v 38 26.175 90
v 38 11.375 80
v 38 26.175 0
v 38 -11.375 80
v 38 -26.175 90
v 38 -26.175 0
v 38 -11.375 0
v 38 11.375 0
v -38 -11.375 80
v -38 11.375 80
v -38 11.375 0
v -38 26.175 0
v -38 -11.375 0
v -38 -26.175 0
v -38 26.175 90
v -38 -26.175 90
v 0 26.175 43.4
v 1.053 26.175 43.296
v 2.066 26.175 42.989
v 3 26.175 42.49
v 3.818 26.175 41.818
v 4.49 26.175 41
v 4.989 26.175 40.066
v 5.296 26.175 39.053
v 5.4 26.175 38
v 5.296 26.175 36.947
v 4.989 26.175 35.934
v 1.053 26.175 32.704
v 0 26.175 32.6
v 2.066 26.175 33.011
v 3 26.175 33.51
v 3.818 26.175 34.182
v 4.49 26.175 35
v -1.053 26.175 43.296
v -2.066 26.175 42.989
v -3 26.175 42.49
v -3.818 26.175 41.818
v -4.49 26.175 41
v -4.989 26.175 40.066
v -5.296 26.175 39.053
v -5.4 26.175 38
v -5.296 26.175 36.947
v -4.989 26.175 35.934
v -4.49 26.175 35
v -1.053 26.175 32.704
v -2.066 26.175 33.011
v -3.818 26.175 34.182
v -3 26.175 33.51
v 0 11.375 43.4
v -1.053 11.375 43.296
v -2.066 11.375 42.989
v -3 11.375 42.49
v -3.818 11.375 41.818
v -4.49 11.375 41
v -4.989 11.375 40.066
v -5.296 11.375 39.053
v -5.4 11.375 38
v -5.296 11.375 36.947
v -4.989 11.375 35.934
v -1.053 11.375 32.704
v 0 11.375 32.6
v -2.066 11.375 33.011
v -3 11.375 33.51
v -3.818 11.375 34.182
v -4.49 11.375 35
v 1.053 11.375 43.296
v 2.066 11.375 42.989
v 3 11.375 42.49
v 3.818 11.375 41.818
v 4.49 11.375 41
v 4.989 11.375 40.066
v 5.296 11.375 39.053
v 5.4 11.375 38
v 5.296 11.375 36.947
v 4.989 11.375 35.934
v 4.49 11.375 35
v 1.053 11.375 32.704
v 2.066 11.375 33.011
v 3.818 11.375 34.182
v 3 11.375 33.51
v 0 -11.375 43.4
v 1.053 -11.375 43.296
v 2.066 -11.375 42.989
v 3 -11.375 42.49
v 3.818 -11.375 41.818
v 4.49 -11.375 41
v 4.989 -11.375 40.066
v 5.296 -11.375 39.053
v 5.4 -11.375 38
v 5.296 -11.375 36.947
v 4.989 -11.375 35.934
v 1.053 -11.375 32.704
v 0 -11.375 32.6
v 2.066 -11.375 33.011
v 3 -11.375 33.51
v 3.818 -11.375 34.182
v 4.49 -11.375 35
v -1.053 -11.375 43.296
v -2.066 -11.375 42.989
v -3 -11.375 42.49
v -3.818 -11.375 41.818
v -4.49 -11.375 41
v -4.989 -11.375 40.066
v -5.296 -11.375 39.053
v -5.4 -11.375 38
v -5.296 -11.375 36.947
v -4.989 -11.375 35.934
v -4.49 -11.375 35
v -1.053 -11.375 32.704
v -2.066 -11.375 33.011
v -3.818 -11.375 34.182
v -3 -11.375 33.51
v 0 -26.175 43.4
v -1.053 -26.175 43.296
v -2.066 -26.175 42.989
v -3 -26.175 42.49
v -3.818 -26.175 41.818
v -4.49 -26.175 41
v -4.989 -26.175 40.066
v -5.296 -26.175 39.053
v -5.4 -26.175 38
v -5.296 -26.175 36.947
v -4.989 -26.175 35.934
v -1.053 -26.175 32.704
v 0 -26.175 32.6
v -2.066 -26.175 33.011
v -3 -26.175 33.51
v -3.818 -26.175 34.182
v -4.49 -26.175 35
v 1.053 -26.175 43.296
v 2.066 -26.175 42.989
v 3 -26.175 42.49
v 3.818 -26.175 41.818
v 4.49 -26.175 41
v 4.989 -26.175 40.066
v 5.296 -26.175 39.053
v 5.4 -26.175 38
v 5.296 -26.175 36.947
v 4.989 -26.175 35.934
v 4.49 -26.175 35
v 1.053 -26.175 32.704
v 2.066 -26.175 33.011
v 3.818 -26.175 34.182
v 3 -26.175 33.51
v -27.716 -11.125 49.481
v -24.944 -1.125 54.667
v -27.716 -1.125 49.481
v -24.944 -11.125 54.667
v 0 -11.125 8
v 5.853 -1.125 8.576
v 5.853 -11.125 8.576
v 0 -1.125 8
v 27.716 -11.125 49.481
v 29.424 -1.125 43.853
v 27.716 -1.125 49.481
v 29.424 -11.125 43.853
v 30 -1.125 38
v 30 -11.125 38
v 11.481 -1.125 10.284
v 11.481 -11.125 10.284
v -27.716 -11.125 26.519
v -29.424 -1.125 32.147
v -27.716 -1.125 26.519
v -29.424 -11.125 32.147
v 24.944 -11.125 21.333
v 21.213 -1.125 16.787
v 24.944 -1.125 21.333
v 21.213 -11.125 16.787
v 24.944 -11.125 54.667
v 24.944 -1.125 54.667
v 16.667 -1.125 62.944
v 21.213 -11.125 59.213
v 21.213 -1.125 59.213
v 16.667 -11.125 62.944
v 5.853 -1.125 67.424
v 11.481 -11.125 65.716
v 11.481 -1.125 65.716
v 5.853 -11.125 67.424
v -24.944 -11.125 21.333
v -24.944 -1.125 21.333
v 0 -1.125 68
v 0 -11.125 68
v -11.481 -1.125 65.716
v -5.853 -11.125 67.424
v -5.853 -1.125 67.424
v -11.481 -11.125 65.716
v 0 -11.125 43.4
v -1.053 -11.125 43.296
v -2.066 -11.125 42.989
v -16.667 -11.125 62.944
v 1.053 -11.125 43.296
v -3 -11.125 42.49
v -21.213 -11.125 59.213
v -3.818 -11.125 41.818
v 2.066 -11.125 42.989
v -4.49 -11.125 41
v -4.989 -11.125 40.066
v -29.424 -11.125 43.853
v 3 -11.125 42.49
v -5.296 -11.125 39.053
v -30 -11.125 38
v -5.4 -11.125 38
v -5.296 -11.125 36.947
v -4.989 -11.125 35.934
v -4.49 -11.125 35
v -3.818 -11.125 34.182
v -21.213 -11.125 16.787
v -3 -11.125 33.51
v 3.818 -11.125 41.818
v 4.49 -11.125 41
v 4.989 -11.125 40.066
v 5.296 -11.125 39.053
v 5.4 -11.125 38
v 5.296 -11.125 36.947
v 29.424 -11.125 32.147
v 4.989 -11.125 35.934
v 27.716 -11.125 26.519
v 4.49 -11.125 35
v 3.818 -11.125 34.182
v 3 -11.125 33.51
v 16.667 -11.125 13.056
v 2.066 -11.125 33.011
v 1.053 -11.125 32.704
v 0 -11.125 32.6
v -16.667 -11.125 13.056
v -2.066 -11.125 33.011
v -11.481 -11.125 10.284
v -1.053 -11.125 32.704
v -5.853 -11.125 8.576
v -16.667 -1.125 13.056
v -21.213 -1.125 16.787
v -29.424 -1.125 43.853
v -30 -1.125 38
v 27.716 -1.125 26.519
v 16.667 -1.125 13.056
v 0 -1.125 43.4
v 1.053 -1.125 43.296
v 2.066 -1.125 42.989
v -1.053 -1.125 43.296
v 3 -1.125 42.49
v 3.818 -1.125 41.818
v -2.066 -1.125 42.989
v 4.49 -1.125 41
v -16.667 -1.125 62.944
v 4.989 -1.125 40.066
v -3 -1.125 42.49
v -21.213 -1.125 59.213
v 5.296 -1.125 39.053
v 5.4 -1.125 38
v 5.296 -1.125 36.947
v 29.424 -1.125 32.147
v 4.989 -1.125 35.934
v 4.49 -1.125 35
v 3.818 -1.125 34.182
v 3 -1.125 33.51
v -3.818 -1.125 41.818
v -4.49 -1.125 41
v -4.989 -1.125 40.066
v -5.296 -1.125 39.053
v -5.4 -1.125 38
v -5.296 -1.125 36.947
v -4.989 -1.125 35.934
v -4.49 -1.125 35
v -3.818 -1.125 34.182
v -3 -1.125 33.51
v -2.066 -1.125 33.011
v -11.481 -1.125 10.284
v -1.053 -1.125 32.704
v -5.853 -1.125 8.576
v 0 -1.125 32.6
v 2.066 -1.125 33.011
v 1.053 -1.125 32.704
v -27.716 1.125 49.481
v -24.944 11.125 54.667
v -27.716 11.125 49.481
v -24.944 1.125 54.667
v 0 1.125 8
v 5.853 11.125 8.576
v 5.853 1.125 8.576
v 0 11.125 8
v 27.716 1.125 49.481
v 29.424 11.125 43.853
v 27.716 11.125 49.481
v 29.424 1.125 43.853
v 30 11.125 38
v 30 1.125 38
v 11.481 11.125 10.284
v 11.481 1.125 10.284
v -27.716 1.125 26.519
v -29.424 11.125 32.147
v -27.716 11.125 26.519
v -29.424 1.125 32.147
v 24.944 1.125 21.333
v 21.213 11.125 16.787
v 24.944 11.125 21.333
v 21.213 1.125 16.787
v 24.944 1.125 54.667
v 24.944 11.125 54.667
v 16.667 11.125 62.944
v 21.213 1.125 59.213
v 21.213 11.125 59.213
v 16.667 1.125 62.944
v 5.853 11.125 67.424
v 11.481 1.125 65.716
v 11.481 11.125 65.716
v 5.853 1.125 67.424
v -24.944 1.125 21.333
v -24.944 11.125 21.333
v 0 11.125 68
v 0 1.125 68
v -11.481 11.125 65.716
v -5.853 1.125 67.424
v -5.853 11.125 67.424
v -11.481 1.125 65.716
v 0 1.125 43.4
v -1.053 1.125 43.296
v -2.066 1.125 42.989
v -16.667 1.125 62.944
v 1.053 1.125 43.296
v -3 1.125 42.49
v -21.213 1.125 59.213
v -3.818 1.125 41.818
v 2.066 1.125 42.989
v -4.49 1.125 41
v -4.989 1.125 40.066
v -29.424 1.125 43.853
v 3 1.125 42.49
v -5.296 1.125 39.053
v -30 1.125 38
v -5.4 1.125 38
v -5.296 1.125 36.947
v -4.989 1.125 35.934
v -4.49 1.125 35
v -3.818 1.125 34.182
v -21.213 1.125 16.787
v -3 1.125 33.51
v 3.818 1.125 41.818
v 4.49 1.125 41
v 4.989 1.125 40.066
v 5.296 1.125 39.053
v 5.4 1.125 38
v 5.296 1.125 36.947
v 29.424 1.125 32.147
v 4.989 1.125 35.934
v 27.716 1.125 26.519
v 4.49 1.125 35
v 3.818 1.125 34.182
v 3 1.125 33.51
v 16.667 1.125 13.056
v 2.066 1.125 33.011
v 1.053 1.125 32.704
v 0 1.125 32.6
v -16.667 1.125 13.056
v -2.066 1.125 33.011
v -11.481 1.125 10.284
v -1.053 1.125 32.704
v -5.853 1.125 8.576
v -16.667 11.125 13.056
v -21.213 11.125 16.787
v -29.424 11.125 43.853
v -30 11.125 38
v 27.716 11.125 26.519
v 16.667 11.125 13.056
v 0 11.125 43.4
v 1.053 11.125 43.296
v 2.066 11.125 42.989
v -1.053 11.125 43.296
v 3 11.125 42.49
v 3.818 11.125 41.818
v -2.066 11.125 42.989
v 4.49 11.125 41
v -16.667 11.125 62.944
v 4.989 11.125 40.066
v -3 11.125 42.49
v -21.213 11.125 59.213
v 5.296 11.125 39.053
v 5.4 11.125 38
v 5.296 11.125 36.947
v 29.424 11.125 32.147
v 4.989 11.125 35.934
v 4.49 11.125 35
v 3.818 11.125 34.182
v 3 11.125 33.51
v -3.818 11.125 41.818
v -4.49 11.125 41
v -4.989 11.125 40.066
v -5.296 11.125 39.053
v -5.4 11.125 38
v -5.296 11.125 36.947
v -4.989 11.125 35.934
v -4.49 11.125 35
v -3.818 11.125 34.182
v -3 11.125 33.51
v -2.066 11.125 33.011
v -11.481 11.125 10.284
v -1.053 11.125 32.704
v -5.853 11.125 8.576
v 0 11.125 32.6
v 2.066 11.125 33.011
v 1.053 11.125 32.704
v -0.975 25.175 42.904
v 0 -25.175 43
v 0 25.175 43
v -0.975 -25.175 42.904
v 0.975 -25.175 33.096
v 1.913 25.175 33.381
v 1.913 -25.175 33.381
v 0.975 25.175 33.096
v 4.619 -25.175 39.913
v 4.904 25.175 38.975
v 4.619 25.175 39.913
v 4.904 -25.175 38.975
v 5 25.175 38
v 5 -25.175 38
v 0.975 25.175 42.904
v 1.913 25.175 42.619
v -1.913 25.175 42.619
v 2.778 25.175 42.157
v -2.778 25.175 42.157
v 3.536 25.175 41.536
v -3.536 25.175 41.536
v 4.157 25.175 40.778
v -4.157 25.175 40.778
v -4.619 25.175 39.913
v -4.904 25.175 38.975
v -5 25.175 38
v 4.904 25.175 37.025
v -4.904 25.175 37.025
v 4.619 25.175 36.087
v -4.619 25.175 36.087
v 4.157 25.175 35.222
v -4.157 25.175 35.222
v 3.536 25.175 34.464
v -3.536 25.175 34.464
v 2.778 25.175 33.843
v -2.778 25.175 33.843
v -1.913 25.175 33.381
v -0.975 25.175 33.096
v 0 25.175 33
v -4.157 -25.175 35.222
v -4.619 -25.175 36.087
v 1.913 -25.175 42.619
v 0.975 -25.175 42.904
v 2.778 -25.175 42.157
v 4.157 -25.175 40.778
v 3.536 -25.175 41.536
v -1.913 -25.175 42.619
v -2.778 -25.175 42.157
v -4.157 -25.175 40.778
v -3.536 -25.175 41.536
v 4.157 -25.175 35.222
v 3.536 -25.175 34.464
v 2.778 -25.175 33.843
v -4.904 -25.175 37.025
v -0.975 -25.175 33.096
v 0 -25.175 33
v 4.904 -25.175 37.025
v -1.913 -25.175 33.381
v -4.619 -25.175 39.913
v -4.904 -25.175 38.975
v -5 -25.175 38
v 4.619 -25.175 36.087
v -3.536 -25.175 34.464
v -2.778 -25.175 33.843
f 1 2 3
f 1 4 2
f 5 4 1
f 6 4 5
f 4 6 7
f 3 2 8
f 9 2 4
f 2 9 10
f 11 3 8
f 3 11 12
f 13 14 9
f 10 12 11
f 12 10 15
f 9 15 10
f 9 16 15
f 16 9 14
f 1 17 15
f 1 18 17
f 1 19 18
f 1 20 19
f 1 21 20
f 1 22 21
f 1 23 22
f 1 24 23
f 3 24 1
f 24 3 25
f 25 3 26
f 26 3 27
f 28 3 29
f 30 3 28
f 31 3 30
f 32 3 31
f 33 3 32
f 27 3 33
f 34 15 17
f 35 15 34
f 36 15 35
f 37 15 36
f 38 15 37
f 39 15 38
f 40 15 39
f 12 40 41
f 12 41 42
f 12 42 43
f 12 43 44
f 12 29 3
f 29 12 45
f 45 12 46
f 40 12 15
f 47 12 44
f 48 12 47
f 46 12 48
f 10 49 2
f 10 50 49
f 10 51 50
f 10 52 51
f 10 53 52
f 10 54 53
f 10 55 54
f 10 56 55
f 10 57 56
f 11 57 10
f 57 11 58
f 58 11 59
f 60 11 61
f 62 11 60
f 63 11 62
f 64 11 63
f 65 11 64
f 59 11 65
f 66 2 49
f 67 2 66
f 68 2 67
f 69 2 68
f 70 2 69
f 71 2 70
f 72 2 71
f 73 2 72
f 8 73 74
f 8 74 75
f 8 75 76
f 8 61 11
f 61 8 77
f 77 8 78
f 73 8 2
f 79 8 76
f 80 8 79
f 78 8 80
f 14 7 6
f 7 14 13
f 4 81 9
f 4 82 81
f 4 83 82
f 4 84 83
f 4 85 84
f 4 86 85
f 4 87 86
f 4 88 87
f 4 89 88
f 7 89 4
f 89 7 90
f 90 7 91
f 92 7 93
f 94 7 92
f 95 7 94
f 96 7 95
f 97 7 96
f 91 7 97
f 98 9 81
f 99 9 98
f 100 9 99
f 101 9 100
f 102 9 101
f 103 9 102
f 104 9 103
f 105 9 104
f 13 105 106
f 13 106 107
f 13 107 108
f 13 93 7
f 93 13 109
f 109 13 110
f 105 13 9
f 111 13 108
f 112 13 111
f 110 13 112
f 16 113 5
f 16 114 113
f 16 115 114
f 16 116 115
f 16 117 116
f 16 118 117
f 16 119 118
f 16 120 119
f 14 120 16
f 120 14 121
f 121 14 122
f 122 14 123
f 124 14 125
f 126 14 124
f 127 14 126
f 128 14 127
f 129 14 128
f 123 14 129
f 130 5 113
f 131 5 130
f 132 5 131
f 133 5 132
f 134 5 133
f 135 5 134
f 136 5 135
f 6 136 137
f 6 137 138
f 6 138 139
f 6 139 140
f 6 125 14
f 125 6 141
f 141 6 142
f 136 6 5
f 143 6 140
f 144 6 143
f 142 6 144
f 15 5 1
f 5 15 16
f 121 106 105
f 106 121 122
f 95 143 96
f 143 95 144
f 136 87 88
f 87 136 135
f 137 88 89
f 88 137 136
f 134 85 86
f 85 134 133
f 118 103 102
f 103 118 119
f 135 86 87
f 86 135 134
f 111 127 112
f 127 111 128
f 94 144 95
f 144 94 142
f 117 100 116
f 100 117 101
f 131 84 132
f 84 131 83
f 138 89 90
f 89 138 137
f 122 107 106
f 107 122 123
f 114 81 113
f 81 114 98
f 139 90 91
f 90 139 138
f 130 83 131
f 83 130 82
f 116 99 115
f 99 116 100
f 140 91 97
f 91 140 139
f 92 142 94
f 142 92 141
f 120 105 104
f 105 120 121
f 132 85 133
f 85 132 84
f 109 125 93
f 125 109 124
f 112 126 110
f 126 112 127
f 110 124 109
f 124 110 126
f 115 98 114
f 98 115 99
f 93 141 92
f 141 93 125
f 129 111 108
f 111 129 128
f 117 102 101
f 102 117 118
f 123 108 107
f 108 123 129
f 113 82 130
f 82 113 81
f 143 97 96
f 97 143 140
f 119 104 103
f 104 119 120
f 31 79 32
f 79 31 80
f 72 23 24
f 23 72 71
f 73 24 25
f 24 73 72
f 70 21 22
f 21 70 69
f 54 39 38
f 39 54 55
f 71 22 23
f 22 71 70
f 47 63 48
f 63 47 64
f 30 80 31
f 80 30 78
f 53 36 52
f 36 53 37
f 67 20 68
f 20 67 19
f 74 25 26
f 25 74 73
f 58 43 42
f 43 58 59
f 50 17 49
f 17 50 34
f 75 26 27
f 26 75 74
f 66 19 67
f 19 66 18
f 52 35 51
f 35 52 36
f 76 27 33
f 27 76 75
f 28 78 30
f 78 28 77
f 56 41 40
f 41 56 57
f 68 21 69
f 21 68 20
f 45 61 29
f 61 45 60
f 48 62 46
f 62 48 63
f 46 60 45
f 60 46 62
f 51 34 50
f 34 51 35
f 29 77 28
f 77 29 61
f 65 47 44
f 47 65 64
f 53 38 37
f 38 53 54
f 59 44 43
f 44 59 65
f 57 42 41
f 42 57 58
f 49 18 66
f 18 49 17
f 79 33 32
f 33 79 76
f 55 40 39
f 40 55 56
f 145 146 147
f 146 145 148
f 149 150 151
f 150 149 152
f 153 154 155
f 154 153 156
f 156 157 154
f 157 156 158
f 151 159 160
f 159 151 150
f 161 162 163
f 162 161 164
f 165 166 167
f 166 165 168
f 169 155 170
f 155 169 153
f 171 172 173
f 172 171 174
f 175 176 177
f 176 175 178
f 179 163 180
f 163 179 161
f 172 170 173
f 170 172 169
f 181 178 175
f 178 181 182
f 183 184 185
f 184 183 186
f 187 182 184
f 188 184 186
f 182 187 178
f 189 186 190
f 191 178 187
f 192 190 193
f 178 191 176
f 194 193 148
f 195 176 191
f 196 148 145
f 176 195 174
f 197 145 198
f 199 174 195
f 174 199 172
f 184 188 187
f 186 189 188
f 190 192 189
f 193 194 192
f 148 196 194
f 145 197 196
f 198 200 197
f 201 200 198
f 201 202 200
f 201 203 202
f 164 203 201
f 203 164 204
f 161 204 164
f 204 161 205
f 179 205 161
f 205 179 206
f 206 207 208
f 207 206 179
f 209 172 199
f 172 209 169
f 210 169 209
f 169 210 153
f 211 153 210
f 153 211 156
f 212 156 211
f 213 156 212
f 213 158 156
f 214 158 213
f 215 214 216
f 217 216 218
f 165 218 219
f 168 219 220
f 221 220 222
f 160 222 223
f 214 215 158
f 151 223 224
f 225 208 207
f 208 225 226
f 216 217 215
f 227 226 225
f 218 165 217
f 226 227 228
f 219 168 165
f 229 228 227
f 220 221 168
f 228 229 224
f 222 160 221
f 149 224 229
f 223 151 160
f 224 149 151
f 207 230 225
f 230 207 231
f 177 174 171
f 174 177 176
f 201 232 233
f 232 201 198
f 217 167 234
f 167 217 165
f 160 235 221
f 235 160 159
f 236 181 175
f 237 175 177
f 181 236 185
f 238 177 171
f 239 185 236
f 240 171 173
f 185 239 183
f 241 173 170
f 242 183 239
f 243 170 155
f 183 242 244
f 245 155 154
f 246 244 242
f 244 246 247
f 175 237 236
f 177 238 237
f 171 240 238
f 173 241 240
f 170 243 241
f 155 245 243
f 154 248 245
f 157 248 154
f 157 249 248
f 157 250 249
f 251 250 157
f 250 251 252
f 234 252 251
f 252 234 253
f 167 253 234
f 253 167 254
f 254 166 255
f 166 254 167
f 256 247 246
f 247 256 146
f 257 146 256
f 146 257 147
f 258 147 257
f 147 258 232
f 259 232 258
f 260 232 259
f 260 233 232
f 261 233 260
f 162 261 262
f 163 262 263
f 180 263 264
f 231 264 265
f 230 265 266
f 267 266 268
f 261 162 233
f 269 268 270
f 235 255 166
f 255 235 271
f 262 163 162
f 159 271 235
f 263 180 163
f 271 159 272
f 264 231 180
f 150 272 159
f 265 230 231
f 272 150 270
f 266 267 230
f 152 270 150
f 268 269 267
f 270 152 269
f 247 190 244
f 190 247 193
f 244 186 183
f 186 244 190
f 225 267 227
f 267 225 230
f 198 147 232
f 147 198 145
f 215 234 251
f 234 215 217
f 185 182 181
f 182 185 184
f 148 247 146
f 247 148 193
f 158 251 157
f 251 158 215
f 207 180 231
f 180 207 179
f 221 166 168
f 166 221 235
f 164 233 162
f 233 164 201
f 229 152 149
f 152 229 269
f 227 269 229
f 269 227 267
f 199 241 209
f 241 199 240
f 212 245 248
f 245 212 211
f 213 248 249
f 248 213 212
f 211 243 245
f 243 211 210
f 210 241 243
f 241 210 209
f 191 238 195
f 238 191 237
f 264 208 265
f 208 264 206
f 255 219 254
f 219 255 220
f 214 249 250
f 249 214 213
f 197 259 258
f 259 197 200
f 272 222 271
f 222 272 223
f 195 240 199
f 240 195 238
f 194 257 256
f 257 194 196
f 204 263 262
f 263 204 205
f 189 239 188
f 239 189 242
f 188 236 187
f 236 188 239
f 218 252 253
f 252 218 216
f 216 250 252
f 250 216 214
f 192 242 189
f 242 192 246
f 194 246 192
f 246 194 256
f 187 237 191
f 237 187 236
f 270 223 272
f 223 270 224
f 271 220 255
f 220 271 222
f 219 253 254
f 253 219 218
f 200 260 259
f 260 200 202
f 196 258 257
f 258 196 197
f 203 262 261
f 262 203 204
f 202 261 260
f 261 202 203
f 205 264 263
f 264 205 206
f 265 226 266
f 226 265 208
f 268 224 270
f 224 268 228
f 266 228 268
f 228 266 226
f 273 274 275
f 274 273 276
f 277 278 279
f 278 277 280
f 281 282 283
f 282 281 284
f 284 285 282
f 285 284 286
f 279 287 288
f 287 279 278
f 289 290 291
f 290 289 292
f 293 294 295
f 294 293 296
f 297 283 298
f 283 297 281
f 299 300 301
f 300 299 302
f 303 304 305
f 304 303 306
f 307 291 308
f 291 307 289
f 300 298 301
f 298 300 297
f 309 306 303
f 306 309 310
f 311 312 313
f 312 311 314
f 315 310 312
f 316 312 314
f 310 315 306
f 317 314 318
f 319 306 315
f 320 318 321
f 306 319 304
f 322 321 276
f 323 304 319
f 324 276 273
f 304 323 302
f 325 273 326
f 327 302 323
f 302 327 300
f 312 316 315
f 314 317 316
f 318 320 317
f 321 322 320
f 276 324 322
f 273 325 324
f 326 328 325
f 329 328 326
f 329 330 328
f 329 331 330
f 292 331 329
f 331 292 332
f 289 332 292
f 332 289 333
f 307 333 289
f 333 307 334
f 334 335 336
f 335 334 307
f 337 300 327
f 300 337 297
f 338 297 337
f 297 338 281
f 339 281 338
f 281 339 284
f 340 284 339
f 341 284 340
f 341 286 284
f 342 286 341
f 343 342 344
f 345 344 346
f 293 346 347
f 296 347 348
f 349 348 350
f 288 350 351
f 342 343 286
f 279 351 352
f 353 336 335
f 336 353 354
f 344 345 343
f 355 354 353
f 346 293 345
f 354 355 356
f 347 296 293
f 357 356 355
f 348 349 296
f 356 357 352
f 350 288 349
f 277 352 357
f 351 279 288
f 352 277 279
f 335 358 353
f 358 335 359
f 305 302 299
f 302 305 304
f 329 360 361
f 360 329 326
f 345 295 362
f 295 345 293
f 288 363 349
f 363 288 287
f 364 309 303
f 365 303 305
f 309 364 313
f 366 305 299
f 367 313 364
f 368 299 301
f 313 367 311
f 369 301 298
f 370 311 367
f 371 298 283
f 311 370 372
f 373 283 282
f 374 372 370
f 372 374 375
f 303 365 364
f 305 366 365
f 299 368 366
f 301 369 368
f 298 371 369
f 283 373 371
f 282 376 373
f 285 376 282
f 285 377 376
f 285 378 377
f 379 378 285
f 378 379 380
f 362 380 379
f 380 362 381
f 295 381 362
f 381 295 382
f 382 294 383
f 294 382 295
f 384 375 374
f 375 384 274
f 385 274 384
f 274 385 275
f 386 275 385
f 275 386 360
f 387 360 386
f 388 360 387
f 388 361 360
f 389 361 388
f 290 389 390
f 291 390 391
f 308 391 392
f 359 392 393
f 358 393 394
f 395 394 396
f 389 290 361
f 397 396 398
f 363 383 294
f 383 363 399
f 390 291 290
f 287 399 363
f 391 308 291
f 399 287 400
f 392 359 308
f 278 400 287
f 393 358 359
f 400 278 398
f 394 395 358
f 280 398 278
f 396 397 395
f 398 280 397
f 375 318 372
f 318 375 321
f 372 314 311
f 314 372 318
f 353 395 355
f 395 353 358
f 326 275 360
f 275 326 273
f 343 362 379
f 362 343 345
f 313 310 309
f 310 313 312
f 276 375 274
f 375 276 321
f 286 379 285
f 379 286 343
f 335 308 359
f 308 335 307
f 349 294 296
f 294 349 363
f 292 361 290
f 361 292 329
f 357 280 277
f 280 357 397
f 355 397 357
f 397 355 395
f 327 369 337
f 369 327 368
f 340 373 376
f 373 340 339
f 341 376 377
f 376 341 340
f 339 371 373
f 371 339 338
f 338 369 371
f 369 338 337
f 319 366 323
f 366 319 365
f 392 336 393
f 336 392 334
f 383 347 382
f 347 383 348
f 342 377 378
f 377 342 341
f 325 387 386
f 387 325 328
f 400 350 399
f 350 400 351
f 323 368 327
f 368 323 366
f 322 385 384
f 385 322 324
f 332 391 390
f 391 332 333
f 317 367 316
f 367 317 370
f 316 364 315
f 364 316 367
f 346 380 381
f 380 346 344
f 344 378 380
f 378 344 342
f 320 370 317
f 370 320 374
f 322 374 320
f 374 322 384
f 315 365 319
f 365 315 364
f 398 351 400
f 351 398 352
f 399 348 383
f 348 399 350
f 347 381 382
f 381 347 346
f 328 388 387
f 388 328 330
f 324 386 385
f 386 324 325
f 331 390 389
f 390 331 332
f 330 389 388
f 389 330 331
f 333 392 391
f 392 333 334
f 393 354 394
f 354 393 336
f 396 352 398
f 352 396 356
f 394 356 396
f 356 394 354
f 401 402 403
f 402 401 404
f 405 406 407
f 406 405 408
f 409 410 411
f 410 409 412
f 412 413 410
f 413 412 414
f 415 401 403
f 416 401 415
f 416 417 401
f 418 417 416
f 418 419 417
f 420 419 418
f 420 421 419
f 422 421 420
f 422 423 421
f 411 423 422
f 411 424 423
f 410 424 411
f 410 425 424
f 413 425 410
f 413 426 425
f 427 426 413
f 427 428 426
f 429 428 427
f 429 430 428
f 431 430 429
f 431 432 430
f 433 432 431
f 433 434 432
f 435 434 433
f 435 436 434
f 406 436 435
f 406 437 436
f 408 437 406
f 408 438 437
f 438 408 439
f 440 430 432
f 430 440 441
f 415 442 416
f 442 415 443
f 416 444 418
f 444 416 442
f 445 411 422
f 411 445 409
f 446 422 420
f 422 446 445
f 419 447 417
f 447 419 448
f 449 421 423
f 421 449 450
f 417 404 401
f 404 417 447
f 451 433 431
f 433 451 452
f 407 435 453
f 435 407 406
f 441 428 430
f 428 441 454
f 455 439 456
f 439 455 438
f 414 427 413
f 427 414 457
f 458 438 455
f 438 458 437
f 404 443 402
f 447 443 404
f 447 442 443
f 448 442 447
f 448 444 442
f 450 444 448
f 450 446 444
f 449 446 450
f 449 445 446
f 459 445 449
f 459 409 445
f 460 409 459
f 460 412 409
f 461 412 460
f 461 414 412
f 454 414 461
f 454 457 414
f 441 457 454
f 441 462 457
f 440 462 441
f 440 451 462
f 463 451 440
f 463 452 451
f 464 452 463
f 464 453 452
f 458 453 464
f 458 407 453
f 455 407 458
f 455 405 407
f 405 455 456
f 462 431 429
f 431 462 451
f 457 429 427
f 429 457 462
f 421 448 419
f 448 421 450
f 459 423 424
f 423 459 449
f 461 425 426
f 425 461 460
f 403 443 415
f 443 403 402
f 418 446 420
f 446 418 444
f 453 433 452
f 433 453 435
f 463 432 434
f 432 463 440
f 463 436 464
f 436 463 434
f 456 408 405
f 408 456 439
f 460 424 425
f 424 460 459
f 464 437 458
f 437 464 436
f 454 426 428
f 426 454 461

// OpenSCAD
$fn = 32;

// ------------------------------------------------------------------------
// Trolley wheel set: wheels d60, fork 80 mm tall
// Every part is its own module, assembly() places every instance.
// ------------------------------------------------------------------------

// --- part 1 ---
module trolley_fork() {
  difference() {
    union() {
      translate([-38, 11.375, 0]) cube([76, 14.8, 80]);
      translate([-38, -26.175, 0]) cube([76, 14.8, 80]);
      translate([-38, -26.175, 80]) cube([76, 52.35, 10]);
    }
    translate([0, -18.775, 38]) rotate([90, 0, 0]) cylinder(h = 16.8, d = 10.8, center = true);
    translate([0, 18.775, 38]) rotate([90, 0, 0]) cylinder(h = 16.8, d = 10.8, center = true);
  }
}

// --- part 2 ---
module trolley_wheel() {
  difference() {
      translate([0, 0, 0]) cylinder(h = 10, d = 60);
      translate([0, 0, -1]) cylinder(h = 12, d = 10.8);
    }
}

// --- part 3 ---
module trolley_axle() {
  translate([0, 0, -25.175]) cylinder(h = 50.35, d = 10);
}

// --- assembly ---
module assembly() {
  color([0.80, 0.24, 0.20]) translate([0, 0, 0]) rotate([0, 0, 0]) trolley_fork();
  color([0.20, 0.45, 0.75]) translate([0, -1.125, 38]) rotate([90, 0, 0]) trolley_wheel();
  color([0.25, 0.62, 0.32]) translate([0, 11.125, 38]) rotate([90, 0, 0]) trolley_wheel();
  color([0.92, 0.70, 0.18]) translate([0, 0, 38]) rotate([90, 0, 0]) trolley_axle();
}

assembly();
